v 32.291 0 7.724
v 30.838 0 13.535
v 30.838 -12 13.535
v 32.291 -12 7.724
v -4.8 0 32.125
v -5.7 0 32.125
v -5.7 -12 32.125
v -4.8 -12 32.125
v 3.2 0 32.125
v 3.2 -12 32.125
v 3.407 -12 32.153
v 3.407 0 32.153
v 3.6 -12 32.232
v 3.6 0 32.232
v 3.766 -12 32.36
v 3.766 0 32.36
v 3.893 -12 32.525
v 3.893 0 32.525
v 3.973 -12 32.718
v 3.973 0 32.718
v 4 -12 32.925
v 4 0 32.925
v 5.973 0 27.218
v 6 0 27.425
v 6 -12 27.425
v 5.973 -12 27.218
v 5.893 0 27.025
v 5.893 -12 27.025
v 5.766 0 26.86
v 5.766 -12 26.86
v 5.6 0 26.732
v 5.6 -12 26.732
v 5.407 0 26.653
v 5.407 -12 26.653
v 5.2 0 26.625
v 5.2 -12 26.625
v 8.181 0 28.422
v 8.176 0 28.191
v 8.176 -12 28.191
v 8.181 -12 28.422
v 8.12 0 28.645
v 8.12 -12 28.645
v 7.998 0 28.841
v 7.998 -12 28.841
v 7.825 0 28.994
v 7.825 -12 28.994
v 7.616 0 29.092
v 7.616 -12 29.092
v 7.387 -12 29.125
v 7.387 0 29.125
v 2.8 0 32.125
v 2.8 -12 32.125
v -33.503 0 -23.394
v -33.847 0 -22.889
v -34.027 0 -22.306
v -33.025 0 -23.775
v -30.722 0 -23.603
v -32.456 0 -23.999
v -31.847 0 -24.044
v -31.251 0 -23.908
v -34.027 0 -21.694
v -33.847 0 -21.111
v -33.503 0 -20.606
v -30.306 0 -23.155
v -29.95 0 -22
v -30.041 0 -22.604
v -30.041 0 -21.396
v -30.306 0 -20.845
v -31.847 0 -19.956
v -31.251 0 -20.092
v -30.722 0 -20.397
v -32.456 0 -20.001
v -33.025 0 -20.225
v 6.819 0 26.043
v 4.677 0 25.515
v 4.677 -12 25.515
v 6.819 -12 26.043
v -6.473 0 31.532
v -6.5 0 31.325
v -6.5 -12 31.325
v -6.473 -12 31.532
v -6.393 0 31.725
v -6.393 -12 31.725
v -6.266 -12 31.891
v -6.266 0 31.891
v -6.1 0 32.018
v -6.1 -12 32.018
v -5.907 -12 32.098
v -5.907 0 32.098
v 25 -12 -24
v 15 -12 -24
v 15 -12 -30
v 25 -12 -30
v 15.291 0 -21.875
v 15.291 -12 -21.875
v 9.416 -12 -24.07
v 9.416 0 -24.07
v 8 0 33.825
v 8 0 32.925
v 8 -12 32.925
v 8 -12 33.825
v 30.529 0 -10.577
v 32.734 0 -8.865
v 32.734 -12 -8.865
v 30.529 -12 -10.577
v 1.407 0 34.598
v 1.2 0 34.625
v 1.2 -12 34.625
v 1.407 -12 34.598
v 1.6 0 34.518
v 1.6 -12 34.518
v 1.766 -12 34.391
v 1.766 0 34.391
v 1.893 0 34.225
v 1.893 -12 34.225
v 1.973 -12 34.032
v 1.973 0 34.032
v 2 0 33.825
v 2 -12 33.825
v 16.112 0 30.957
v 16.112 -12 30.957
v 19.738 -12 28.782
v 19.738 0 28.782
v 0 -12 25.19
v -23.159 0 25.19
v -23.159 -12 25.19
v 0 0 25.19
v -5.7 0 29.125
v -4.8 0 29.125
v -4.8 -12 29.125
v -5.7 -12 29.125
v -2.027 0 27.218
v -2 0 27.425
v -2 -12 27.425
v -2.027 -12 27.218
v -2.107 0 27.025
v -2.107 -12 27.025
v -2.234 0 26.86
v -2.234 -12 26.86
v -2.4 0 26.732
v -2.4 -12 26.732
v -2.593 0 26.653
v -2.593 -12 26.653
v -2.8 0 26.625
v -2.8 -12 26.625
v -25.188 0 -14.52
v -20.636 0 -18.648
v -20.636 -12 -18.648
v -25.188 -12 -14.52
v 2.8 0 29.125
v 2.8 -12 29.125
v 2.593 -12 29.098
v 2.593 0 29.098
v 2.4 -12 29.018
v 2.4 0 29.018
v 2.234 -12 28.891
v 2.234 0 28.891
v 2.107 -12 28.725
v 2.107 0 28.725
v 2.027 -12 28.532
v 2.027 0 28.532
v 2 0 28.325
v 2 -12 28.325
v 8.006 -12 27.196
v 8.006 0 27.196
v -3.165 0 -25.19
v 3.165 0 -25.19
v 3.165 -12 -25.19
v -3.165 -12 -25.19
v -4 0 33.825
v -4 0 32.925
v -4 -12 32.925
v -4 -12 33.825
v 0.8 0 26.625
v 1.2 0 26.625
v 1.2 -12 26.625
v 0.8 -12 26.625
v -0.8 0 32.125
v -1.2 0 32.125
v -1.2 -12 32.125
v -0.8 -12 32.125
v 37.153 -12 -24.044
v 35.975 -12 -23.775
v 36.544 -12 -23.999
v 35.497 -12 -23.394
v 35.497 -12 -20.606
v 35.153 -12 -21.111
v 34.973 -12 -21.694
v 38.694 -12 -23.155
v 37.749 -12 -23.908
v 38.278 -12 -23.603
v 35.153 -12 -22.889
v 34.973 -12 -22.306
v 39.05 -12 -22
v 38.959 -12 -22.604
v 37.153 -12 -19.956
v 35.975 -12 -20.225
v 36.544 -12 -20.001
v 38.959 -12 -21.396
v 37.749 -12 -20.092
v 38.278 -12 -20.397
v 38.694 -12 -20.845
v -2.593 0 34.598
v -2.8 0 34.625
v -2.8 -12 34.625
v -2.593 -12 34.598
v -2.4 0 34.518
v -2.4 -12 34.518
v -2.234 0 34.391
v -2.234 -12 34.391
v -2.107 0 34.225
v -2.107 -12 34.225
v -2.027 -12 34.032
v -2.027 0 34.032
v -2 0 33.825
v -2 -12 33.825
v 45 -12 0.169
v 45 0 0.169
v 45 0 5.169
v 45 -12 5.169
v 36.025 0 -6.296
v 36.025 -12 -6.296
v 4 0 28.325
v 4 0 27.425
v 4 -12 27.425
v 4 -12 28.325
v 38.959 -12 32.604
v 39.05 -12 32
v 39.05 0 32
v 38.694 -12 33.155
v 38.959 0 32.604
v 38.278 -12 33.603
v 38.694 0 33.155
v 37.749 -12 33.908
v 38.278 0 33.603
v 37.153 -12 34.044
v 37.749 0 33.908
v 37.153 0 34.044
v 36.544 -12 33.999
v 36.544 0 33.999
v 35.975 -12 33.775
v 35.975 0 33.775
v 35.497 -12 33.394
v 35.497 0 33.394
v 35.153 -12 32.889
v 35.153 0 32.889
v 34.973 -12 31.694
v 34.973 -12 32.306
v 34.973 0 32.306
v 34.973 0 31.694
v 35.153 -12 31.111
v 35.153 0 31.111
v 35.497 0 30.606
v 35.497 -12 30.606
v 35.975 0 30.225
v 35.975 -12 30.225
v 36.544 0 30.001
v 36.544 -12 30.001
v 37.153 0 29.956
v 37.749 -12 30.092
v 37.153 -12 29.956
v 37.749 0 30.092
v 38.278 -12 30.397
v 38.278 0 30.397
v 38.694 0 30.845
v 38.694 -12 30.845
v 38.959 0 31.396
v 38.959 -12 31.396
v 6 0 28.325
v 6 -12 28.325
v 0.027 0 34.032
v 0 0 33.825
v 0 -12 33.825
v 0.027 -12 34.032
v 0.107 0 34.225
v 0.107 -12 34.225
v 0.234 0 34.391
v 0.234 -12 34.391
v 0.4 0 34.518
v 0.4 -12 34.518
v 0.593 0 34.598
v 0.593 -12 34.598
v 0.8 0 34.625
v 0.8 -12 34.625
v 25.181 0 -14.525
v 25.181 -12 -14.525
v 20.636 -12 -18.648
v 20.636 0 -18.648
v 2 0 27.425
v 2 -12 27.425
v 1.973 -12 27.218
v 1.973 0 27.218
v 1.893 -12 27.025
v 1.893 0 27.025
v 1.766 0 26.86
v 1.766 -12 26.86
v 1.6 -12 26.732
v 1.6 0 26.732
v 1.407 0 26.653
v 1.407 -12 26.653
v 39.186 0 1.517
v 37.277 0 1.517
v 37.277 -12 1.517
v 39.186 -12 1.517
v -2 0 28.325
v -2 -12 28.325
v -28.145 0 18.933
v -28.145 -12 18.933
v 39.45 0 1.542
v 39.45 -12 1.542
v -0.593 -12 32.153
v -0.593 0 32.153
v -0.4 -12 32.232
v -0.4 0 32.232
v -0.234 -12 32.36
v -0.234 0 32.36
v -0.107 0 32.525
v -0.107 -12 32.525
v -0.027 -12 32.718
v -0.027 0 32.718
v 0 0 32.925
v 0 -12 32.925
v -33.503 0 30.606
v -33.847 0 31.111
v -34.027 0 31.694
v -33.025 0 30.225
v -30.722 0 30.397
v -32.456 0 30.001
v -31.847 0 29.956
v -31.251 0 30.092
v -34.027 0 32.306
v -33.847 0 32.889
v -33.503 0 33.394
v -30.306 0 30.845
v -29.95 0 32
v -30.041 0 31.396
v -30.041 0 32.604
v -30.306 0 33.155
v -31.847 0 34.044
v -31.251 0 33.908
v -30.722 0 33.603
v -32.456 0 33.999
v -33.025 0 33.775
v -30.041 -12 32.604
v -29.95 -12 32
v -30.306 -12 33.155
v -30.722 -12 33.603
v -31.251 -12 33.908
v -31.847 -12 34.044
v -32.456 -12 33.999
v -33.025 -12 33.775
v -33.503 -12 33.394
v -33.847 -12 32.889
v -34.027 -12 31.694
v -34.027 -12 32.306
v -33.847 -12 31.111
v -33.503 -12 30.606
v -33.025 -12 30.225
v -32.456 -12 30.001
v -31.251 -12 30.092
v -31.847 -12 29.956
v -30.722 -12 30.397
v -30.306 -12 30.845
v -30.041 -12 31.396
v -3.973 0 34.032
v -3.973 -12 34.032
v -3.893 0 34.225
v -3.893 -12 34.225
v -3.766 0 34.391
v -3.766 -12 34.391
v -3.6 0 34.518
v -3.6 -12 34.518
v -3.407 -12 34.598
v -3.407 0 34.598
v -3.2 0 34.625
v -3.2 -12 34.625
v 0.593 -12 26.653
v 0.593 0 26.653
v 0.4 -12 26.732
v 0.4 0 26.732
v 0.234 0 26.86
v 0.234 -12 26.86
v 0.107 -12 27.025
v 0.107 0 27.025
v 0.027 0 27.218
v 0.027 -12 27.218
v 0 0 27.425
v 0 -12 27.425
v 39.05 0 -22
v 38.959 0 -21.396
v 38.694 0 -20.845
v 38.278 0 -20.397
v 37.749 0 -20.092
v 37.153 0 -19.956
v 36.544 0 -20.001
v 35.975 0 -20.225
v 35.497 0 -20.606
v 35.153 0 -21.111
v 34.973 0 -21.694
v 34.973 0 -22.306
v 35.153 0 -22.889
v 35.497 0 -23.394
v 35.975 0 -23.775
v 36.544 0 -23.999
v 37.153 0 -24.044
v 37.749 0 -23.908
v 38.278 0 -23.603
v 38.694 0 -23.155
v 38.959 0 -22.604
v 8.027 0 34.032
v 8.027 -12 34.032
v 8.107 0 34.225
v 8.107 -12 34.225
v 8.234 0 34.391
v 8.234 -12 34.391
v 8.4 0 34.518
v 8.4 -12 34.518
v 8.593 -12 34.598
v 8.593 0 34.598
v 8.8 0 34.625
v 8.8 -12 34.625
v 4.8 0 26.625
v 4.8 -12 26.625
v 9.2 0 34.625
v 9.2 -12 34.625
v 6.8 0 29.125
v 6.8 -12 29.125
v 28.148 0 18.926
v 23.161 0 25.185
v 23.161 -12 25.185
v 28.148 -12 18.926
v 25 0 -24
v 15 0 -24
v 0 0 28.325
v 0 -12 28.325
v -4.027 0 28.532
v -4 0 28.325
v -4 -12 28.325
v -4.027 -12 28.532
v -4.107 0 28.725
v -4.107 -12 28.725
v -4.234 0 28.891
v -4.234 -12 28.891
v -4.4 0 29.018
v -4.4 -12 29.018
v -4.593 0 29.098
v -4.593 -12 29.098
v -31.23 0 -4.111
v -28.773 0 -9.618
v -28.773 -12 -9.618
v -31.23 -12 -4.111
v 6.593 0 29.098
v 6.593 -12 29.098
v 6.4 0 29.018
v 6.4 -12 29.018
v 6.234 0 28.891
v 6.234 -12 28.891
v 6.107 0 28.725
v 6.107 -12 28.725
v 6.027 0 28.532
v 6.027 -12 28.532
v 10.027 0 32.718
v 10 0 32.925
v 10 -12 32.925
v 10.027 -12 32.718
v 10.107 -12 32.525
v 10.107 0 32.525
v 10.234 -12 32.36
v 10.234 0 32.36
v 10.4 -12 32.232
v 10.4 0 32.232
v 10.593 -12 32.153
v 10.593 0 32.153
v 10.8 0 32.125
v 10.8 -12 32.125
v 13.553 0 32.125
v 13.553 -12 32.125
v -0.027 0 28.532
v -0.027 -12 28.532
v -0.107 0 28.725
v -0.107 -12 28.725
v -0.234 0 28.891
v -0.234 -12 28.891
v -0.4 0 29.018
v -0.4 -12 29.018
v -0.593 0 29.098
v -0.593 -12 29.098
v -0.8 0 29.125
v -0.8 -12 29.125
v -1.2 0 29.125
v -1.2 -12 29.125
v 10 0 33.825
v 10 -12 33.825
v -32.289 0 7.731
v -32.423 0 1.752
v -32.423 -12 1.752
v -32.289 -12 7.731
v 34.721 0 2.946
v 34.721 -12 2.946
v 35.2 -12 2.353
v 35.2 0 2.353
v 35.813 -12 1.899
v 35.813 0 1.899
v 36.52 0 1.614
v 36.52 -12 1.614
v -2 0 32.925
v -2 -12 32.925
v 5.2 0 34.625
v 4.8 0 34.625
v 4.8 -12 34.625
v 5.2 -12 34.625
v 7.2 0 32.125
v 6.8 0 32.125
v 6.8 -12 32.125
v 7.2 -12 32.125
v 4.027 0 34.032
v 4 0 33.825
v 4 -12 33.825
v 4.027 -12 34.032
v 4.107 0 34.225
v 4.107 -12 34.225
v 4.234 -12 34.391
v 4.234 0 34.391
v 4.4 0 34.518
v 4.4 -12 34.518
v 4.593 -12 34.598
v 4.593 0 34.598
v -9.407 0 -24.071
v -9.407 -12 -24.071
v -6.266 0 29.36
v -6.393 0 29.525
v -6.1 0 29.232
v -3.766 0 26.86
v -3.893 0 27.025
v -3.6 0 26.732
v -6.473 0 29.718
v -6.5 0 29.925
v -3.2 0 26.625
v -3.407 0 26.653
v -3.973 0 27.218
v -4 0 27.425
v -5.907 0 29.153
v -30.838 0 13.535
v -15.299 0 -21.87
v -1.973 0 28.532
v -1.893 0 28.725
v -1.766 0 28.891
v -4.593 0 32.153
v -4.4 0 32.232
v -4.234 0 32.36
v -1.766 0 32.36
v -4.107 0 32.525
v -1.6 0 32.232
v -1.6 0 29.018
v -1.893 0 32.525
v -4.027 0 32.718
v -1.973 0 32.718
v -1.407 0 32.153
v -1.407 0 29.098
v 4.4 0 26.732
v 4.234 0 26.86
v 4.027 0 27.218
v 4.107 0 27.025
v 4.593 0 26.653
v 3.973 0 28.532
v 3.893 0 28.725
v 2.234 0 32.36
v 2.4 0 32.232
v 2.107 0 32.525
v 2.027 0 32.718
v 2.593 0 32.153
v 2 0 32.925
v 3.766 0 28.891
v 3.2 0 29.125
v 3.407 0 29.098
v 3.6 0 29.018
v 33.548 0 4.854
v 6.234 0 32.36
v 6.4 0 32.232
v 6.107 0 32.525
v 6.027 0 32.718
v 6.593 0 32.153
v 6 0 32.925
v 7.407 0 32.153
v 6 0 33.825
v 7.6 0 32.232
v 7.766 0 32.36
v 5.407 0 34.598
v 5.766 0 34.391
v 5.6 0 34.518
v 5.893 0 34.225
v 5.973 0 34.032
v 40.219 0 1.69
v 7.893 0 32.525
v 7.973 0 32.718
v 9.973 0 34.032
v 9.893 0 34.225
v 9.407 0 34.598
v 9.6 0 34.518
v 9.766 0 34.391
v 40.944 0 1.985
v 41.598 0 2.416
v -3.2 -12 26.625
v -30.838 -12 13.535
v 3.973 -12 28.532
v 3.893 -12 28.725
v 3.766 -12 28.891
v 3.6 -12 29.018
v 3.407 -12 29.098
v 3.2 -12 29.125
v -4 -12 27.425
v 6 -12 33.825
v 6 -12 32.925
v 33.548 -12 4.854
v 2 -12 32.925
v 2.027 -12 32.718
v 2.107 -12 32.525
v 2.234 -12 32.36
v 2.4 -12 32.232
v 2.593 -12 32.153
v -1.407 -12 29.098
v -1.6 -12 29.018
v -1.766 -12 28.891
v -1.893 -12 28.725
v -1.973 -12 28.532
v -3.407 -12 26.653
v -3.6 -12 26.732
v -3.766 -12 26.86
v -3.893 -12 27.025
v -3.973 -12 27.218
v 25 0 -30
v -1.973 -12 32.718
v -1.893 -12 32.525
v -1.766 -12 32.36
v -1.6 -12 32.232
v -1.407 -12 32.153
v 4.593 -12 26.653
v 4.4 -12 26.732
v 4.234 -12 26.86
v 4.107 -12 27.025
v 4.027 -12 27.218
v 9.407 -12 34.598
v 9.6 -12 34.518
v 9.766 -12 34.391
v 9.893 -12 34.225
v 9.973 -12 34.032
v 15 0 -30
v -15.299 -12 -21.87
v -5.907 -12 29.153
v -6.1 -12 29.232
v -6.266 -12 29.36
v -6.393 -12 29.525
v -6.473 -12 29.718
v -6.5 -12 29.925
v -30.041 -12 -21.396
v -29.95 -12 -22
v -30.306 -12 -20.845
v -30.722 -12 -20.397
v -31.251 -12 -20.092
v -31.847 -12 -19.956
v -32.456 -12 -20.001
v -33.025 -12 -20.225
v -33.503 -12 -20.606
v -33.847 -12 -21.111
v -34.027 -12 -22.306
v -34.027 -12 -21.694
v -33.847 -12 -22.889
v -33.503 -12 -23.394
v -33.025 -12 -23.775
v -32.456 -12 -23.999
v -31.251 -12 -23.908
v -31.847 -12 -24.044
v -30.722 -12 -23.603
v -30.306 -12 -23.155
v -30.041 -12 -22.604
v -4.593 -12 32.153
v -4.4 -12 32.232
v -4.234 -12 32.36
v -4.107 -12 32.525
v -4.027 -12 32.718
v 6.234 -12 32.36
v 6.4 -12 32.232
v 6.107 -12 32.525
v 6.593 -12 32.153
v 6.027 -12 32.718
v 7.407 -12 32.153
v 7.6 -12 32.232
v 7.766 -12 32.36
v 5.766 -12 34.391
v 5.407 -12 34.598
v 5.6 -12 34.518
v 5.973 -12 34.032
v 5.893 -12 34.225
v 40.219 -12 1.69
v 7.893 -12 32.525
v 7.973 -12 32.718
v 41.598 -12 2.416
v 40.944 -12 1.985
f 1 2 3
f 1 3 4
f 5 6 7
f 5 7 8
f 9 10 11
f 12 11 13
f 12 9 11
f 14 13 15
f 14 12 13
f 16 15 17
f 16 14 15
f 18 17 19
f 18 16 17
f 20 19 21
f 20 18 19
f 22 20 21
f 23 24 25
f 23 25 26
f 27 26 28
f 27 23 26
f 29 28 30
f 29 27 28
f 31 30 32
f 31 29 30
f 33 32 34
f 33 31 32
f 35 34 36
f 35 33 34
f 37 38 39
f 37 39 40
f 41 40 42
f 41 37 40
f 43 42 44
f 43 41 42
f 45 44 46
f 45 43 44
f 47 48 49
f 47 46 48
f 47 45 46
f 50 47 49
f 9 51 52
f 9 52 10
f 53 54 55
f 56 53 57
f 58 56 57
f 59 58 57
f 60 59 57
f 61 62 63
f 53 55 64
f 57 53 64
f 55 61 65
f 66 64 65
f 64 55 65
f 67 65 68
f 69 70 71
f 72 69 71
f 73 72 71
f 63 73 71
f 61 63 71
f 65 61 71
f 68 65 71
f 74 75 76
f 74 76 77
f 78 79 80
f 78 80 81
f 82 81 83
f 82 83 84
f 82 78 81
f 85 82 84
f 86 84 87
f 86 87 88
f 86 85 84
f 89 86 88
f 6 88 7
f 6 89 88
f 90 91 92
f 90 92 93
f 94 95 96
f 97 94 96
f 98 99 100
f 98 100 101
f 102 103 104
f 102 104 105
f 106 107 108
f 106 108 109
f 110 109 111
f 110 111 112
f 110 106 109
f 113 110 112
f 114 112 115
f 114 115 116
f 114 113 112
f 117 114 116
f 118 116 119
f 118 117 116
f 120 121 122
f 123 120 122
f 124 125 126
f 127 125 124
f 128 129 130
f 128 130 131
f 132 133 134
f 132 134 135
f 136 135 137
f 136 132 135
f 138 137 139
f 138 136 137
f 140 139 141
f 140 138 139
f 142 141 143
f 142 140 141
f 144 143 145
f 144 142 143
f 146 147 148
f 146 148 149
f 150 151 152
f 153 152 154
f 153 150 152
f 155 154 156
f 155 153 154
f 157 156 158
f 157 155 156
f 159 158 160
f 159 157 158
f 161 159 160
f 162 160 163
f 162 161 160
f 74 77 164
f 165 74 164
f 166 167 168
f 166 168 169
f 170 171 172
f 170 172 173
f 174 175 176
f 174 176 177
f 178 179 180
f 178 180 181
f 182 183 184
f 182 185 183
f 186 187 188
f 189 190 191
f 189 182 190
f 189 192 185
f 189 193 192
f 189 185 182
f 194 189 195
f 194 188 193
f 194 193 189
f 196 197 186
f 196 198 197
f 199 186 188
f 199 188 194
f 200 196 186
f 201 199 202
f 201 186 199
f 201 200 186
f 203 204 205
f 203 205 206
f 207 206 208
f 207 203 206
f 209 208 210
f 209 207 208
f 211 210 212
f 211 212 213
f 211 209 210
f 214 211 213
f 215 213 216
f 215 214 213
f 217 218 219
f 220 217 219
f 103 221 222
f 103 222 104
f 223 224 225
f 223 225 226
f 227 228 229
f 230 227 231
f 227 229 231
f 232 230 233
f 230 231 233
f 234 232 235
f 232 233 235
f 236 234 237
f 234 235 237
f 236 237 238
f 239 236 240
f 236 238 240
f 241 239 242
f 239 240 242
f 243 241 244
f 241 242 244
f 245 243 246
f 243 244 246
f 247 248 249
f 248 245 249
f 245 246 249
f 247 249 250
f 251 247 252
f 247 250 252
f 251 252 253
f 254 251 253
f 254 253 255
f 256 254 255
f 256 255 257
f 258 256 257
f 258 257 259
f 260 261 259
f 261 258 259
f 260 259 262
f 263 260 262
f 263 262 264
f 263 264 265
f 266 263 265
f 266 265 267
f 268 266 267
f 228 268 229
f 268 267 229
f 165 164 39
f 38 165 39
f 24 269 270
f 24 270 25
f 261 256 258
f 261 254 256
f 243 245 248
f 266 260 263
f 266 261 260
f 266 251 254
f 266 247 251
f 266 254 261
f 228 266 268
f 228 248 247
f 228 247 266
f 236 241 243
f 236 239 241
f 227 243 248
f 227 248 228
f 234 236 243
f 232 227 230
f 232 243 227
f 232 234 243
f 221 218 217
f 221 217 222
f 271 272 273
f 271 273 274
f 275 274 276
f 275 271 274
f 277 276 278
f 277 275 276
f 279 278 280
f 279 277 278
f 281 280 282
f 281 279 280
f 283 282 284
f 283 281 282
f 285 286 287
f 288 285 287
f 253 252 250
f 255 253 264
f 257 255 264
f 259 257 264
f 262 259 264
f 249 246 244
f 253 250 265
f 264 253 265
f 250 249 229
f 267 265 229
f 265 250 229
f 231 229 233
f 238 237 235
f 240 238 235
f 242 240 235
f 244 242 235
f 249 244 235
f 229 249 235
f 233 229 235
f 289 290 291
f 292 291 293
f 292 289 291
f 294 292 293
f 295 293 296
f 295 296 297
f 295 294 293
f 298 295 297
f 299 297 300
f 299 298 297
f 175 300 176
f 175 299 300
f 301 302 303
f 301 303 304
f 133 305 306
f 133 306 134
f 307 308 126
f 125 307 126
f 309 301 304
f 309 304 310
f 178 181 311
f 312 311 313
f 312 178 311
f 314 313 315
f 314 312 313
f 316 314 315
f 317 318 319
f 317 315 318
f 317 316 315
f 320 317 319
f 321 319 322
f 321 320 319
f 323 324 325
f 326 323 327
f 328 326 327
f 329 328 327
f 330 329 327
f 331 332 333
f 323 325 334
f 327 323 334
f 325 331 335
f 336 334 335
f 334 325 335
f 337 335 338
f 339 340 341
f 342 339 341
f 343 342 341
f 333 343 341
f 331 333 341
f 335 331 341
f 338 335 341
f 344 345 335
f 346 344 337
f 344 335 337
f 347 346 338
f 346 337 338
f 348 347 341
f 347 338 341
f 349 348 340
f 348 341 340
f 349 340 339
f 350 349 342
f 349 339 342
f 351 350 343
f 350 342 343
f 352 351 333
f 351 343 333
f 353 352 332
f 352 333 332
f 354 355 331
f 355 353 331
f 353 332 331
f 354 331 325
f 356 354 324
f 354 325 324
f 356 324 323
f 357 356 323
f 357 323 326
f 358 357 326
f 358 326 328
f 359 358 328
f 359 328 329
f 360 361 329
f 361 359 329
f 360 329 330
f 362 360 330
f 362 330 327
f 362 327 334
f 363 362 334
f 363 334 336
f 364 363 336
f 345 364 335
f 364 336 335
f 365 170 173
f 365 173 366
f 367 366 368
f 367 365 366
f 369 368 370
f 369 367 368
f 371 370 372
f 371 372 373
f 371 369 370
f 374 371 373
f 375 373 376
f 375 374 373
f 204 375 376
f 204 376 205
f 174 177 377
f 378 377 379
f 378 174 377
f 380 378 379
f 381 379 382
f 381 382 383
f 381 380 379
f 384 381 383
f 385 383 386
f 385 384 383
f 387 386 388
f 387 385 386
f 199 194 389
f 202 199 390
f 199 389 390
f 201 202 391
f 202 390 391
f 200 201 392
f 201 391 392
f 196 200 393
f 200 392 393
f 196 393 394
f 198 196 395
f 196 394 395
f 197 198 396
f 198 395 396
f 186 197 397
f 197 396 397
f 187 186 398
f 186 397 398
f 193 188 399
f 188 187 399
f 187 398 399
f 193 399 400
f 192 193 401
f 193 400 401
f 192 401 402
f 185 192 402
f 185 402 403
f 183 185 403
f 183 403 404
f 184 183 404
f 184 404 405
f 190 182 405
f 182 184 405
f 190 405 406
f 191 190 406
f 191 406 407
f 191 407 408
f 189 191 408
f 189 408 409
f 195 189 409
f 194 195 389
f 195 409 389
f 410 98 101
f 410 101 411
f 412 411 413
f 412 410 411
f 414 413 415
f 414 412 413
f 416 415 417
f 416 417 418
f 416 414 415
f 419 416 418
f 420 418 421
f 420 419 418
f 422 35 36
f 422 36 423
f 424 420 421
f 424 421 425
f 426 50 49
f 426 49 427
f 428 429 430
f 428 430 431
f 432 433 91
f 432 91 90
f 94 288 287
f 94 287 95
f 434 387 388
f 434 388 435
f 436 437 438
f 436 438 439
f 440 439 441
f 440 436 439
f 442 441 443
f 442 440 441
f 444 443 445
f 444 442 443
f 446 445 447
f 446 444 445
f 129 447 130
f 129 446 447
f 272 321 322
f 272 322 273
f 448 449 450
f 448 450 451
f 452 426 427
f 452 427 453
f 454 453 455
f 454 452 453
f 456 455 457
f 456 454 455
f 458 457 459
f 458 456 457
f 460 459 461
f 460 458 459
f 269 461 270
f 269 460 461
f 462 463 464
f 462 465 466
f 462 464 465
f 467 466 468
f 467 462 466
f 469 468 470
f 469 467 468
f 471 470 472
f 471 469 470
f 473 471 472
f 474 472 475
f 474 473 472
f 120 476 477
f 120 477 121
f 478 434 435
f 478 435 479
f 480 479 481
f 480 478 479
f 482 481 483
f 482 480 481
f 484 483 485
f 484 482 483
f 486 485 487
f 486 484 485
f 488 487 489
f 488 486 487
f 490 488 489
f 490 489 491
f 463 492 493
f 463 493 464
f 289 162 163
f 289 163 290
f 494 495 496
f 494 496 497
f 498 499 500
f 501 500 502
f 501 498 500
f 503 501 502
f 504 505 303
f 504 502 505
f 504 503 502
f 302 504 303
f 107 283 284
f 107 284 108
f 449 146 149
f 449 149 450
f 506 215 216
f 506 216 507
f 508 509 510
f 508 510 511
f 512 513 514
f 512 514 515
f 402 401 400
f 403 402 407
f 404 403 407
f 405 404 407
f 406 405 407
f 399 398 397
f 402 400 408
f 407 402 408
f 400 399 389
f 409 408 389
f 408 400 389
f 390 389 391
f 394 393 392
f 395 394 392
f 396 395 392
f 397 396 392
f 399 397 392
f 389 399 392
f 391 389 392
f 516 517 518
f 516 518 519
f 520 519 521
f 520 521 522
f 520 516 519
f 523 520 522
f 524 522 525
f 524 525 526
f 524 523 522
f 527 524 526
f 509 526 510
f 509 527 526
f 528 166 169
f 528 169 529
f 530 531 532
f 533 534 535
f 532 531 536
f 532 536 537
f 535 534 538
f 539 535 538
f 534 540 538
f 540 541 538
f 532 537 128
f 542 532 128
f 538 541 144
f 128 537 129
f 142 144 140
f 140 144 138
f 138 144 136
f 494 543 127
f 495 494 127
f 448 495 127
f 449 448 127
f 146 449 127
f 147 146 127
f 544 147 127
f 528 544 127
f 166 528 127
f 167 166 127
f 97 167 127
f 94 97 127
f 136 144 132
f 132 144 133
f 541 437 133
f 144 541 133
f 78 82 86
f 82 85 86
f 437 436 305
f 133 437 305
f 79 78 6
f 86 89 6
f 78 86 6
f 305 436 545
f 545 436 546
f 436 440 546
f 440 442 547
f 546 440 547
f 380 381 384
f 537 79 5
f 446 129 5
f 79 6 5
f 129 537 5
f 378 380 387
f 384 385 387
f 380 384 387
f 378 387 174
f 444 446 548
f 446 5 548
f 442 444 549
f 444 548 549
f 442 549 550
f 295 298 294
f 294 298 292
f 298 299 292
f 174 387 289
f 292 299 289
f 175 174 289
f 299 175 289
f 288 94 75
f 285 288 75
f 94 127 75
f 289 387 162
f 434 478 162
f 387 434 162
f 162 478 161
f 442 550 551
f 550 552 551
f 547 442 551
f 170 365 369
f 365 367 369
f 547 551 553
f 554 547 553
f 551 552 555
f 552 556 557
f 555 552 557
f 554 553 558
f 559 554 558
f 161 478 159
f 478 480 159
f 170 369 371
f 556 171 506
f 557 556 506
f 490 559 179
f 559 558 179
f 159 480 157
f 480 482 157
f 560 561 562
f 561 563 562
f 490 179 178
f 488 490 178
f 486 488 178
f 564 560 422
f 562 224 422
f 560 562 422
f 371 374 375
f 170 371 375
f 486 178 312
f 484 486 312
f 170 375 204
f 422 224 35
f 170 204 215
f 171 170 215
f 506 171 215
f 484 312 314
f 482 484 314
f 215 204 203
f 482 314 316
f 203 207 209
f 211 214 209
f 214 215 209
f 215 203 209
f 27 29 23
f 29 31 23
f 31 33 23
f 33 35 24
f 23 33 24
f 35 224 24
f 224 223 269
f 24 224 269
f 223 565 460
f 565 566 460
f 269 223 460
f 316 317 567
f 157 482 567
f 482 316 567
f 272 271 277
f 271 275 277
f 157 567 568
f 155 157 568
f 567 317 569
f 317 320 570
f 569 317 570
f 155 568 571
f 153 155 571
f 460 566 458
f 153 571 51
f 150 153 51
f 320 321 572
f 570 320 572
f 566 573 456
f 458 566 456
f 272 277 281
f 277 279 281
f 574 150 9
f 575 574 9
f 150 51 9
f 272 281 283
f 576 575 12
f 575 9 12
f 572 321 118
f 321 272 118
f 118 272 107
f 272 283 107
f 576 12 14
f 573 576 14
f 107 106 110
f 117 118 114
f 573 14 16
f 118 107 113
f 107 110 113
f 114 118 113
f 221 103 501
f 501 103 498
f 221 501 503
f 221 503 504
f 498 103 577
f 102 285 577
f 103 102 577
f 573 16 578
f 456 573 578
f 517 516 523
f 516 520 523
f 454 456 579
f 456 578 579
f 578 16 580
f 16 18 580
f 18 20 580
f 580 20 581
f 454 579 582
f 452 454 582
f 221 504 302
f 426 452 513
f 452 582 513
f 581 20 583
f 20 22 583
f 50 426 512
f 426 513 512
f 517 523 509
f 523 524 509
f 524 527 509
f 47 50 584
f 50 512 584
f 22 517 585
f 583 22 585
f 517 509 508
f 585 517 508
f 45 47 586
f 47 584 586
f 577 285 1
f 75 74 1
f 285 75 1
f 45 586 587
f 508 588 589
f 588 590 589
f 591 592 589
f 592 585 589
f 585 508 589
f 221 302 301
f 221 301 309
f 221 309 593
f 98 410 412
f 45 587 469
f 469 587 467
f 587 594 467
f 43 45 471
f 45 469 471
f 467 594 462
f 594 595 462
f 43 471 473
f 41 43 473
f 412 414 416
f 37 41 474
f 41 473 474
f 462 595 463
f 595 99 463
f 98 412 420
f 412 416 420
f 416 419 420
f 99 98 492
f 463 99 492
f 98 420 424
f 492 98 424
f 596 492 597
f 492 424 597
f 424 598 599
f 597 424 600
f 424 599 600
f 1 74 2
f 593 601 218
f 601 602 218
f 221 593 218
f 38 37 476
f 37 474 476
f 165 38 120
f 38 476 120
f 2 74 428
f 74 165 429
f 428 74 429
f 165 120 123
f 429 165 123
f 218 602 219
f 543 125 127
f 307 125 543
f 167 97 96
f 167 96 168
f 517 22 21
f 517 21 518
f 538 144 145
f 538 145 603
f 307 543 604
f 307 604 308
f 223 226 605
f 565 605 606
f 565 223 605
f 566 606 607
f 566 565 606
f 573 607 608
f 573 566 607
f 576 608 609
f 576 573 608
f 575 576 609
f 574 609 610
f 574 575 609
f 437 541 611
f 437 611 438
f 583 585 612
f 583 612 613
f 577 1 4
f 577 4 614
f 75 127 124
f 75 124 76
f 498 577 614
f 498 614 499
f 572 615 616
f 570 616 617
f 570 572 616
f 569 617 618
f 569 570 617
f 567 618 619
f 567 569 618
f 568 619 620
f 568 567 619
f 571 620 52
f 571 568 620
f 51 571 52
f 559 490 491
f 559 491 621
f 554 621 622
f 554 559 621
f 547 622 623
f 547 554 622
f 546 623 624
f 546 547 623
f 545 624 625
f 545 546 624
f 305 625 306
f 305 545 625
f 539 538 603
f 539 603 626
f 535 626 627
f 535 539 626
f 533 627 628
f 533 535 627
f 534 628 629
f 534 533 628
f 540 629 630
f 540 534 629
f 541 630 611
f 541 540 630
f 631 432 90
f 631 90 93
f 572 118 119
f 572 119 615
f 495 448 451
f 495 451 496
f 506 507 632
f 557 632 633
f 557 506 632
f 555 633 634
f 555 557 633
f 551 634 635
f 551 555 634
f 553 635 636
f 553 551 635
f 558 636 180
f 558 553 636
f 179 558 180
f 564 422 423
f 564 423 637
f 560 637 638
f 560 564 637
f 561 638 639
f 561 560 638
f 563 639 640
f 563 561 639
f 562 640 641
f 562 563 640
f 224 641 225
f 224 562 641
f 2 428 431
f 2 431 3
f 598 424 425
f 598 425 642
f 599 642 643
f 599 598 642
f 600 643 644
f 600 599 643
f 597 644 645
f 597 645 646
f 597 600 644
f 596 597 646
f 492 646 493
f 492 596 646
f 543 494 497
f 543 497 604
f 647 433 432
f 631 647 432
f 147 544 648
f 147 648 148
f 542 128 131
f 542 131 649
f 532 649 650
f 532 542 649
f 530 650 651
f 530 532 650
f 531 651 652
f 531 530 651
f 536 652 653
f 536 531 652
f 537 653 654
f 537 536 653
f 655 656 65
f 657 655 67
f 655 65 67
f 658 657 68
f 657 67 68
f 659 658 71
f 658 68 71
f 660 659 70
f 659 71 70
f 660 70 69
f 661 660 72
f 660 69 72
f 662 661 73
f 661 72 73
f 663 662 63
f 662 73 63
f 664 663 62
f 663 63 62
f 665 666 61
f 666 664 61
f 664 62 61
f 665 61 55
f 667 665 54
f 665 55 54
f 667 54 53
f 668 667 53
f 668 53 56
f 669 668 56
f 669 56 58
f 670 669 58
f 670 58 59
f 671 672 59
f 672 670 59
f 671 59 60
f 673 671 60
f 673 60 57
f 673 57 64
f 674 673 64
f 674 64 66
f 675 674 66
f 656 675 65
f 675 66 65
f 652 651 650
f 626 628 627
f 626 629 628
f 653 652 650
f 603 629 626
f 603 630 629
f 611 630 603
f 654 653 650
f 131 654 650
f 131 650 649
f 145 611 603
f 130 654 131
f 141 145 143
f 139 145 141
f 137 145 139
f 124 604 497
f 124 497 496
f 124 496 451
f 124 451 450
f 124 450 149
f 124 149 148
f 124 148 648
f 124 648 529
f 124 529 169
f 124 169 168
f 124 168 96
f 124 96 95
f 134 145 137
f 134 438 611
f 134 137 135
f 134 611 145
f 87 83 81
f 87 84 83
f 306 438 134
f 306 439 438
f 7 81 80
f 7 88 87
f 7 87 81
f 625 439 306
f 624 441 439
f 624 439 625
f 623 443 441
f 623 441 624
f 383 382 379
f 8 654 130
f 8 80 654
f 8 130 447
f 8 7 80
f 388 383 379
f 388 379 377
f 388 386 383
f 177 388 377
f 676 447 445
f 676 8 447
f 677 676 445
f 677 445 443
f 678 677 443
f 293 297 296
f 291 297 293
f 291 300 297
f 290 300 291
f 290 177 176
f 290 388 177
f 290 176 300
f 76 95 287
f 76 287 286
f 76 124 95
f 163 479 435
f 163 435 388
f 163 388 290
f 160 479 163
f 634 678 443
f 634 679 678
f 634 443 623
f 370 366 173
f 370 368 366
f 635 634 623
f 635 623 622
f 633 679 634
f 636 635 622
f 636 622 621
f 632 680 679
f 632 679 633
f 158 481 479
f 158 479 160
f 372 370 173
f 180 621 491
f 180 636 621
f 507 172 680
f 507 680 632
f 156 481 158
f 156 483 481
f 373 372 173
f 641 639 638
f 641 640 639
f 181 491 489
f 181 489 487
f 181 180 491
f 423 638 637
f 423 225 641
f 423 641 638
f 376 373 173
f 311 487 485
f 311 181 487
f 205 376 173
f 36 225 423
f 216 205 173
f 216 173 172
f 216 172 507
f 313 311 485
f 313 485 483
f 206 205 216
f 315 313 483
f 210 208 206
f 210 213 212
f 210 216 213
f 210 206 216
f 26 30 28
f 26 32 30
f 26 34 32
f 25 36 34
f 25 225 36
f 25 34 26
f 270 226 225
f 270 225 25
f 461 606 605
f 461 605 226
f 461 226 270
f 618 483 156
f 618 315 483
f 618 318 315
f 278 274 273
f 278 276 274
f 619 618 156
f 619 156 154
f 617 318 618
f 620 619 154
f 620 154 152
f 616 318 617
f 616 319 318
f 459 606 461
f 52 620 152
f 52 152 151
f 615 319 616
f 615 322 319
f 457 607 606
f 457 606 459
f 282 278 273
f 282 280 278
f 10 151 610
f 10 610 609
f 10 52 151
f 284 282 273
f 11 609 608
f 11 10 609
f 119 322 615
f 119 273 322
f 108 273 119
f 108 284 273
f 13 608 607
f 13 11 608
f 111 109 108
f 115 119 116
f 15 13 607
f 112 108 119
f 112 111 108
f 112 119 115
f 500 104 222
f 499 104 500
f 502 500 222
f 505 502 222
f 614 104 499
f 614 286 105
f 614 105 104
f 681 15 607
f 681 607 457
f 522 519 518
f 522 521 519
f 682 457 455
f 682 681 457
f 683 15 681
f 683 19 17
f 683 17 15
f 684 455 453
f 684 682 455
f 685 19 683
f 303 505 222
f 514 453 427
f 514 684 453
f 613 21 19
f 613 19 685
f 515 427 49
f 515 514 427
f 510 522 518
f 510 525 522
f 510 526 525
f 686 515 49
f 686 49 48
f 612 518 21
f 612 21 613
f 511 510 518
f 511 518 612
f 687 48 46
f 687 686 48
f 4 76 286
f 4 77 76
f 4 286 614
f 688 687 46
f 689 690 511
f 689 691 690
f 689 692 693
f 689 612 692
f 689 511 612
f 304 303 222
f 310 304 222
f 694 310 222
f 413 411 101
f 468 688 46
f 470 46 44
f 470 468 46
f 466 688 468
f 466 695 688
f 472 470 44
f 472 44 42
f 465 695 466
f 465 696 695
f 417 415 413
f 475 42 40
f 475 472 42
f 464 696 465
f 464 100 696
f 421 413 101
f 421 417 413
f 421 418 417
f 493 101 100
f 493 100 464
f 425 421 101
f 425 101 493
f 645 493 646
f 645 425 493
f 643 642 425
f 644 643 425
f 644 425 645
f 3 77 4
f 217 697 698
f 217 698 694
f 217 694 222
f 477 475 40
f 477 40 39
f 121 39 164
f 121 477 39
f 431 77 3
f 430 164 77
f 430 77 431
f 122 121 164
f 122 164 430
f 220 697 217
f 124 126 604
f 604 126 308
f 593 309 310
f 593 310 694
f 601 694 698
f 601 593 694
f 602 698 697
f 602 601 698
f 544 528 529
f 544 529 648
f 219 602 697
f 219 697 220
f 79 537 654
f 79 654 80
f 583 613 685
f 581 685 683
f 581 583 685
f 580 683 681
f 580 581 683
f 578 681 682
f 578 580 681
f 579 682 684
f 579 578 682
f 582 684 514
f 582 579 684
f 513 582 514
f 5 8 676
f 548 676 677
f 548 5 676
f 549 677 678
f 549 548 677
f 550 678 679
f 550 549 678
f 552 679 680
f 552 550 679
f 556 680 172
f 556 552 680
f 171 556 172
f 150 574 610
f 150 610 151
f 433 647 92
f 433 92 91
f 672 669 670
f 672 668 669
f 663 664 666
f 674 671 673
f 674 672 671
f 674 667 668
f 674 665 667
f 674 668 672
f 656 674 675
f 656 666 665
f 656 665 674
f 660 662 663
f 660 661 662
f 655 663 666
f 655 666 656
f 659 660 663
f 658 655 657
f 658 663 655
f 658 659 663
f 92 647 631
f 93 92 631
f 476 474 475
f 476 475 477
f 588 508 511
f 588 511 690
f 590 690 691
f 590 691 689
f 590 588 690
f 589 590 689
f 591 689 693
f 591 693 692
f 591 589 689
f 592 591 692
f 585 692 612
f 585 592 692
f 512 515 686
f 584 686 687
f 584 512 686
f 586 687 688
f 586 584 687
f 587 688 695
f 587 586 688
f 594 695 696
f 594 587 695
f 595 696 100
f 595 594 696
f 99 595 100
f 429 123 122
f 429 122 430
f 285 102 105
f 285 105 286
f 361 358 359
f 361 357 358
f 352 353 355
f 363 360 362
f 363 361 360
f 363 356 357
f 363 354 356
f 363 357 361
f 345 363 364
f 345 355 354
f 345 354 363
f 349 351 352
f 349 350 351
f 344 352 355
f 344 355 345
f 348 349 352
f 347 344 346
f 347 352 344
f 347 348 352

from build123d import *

# Parameters (mm, degrees)
F1_W     = 85
F1_H     = 70
F5_DEPTH = 12
F4_R     = 2.05
F6_DEPTH = 62.1


with BuildPart() as f5:
    # F1 (on Front) → F5 (new body)
    with BuildSketch(Plane.XZ):
        with Locations((2.5, 5)):
            Rectangle(F1_W, F1_H)
    extrude(amount=F5_DEPTH)

    # F4 (on Front) → F6 (cut)
    with BuildSketch(Plane.XZ):
        with BuildLine():
            Line((-31.2299812068, -4.1114716804), (-32.4227339013, 1.7524078222))
            Line((-32.4227339013, 1.7524078222), (-32.2888896622, 7.7311653504))
            Line((-32.2888896622, 7.7311653504), (-30.8379518083, 13.5349290141))
            Line((-30.8379518083, 13.5349290141), (-28.1447099737, 18.9326484028))
            Line((-28.1447099737, 18.9326484028), (-23.1589180792, 25.1899009997))
            Line((-23.1589180792, 25.1899009997), (0, 25.1899009997))
            Line((0, 25.1899009997), (4.6769347973, 25.515306741))
            Line((4.6769347973, 25.515306741), (6.8192416802, 26.0426457971))
            Line((6.8192416802, 26.0426457971), (8.0057503656, 27.1961949766))
            Line((8.0057503656, 27.1961949766), (8.175598207, 28.190600854))
            ThreePointArc((8.175598207, 28.190600854), (7.9984731162, 28.8411641896), (7.3870184391, 29.1252929092))
            Line((7.3870184391, 29.1252929092), (6.8, 29.1252929092))
            ThreePointArc((6.8, 29.1252929092), (6.2343145751, 28.8909783342), (6, 28.3252929092))
            Line((6, 28.3252929092), (6, 27.4252929092))
            ThreePointArc((6, 27.4252929092), (5.7656854249, 26.8596074843), (5.2, 26.6252929092))
            Line((5.2, 26.6252929092), (4.8, 26.6252929092))
            ThreePointArc((4.8, 26.6252929092), (4.2343145751, 26.8596074843), (4, 27.4252929092))
            Line((4, 27.4252929092), (4, 28.3252929092))
            ThreePointArc((4, 28.3252929092), (3.7656854249, 28.8909783342), (3.2, 29.1252929092))
            Line((3.2, 29.1252929092), (2.8, 29.1252929092))
            ThreePointArc((2.8, 29.1252929092), (2.2343145751, 28.8909783342), (2, 28.3252929092))
            Line((2, 28.3252929092), (2, 27.4252929092))
            ThreePointArc((2, 27.4252929092), (1.7656854249, 26.8596074843), (1.2, 26.6252929092))
            Line((1.2, 26.6252929092), (0.8, 26.6252929092))
            ThreePointArc((0.8, 26.6252929092), (0.2343145751, 26.8596074843), (0, 27.4252929092))
            Line((0, 27.4252929092), (0, 28.3252929092))
            ThreePointArc((0, 28.3252929092), (-0.2343145751, 28.8909783342), (-0.8, 29.1252929092))
            Line((-0.8, 29.1252929092), (-1.2, 29.1252929092))
            ThreePointArc((-1.2, 29.1252929092), (-1.7656854249, 28.8909783342), (-2, 28.3252929092))
            Line((-2, 28.3252929092), (-2, 27.4252929092))
            ThreePointArc((-2, 27.4252929092), (-2.2343145751, 26.8596074843), (-2.8, 26.6252929092))
            Line((-2.8, 26.6252929092), (-3.2, 26.6252929092))
            ThreePointArc((-3.2, 26.6252929092), (-3.7656854249, 26.8596074843), (-4, 27.4252929092))
            Line((-4, 27.4252929092), (-4, 28.3252929092))
            ThreePointArc((-4, 28.3252929092), (-4.2343145751, 28.8909783342), (-4.8, 29.1252929092))
            Line((-4.8, 29.1252929092), (-5.7, 29.1252929092))
            ThreePointArc((-5.7, 29.1252929092), (-6.2656854249, 29.3596074843), (-6.5, 29.9252929092))
            Line((-6.5, 29.9252929092), (-6.5, 31.3252929092))
            ThreePointArc((-6.5, 31.3252929092), (-6.2656854249, 31.8909783342), (-5.7, 32.1252929092))
            Line((-5.7, 32.1252929092), (-4.8, 32.1252929092))
            ThreePointArc((-4.8, 32.1252929092), (-4.2343145751, 32.3596074843), (-4, 32.9252929092))
            Line((-4, 32.9252929092), (-4, 33.8252929092))
            ThreePointArc((-4, 33.8252929092), (-3.7656854249, 34.3909783342), (-3.2, 34.6252929092))
            Line((-3.2, 34.6252929092), (-2.8, 34.6252929092))
            ThreePointArc((-2.8, 34.6252929092), (-2.2343145751, 34.3909783342), (-2, 33.8252929092))
            Line((-2, 33.8252929092), (-2, 32.9252929092))
            ThreePointArc((-2, 32.9252929092), (-1.7656854249, 32.3596074843), (-1.2, 32.1252929092))
            Line((-1.2, 32.1252929092), (-0.8, 32.1252929092))
            ThreePointArc((-0.8, 32.1252929092), (-0.2343145751, 32.3596074843), (0, 32.9252929092))
            Line((0, 32.9252929092), (0, 33.8252929092))
            ThreePointArc((0, 33.8252929092), (0.2343145751, 34.3909783342), (0.8, 34.6252929092))
            Line((0.8, 34.6252929092), (1.2, 34.6252929092))
            ThreePointArc((1.2, 34.6252929092), (1.7656854249, 34.3909783342), (2, 33.8252929092))
            Line((2, 33.8252929092), (2, 32.9252929092))
            ThreePointArc((2, 32.9252929092), (2.2343145751, 32.3596074843), (2.8, 32.1252929092))
            Line((2.8, 32.1252929092), (3.2, 32.1252929092))
            ThreePointArc((3.2, 32.1252929092), (3.7656854249, 32.3596074843), (4, 32.9252929092))
            Line((4, 32.9252929092), (4, 33.8252929092))
            ThreePointArc((4, 33.8252929092), (4.2343145751, 34.3909783342), (4.8, 34.6252929092))
            Line((4.8, 34.6252929092), (5.2, 34.6252929092))
            ThreePointArc((5.2, 34.6252929092), (5.7656854249, 34.3909783342), (6, 33.8252929092))
            Line((6, 33.8252929092), (6, 32.9252929092))
            ThreePointArc((6, 32.9252929092), (6.2343145751, 32.3596074843), (6.8, 32.1252929092))
            Line((6.8, 32.1252929092), (7.2, 32.1252929092))
            ThreePointArc((7.2, 32.1252929092), (7.7656854249, 32.3596074843), (8, 32.9252929092))
            Line((8, 32.9252929092), (8, 33.8252929092))
            ThreePointArc((8, 33.8252929092), (8.2343145751, 34.3909783342), (8.8, 34.6252929092))
            Line((8.8, 34.6252929092), (9.2, 34.6252929092))
            ThreePointArc((9.2, 34.6252929092), (9.7656854249, 34.3909783342), (10, 33.8252929092))
            Line((10, 33.8252929092), (10, 32.9252929092))
            ThreePointArc((10, 32.9252929092), (10.2343145751, 32.3596074843), (10.8, 32.1252929092))
            Line((10.8, 32.1252929092), (10.9885356627, 32.1252929092))
            Line((10.9885356627, 32.1252929092), (13.5531716812, 32.1252929092))
            Line((13.5531716812, 32.1252929092), (16.1120866663, 30.9570903004))
            Line((16.1120866663, 30.9570903004), (19.7375298716, 28.7818243773))
            Line((19.7375298716, 28.7818243773), (23.1610051704, 25.1846330154))
            Line((23.1610051704, 25.1846330154), (28.1482424629, 18.9255686875))
            Line((28.1482424629, 18.9255686875), (30.8379520327, 13.5349285645))
            Line((30.8379520327, 13.5349285645), (32.290701789, 7.7239123706))
            Line((32.290701789, 7.7239123706), (33.5483700037, 4.8540960997))
            Line((33.5483700037, 4.8540960997), (34.7211838335, 2.9462716643))
            ThreePointArc((34.7211838335, 2.9462716643), (35.8128741717, 1.8988475717), (37.2768951397, 1.5173667343))
            Line((37.2768951397, 1.5173667343), (39.1860567033, 1.5173667343))
            Line((39.1860567033, 1.5173667343), (39.4498927766, 1.5417703444))
            ThreePointArc((39.4498927766, 1.5417703444), (40.5887928176, 1.8196343038), (41.5982242897, 2.4157465302))
            Line((41.5982242897, 2.4157465302), (45, 5.1694697241))
            Line((45, 5.1694697241), (45, 40))
            Line((45, 40), (-40, 40))
            Line((-40, 40), (-40, -30))
            Line((-40, -30), (15, -30))
            Line((15, -30), (15, -24))
            Line((15, -24), (25, -24))
            Line((25, -24), (25, -30))
            Line((25, -30), (45, -30))
            Line((45, -30), (45, 0.1694697241))
            Line((45, 0.1694697241), (36.0250361264, -6.2958477065))
            Line((36.0250361264, -6.2958477065), (32.733798027, -8.8646188378))
            Line((32.733798027, -8.8646188378), (30.5286142975, -10.5767725036))
            Line((30.5286142975, -10.5767725036), (25.1814303744, -14.5250959721))
            Line((25.1814303744, -14.5250959721), (20.6364464315, -18.6477240923))
            Line((20.6364464315, -18.6477240923), (15.2913826186, -21.8750180972))
            Line((15.2913826186, -21.8750180972), (9.4160128543, -24.0695341256))
            Line((9.4160128543, -24.0695341256), (3.1645428201, -25.189627))
            Line((3.1645428201, -25.189627), (-3.1645438201, -25.189627))
            Line((-3.1645438201, -25.189627), (-9.4069449348, -24.0711590285))
            Line((-9.4069449348, -24.0711590285), (-15.29903657, -21.8703966676))
            Line((-15.29903657, -21.8703966676), (-20.6364439779, -18.647726234))
            Line((-20.6364439779, -18.647726234), (-25.1875165353, -14.5195763818))
            Line((-25.1875165353, -14.5195763818), (-28.7727317318, -9.6175337402))
            Line((-28.7727317318, -9.6175337402), (-31.2299812068, -4.1114716804))
        make_face()
        with Locations((-32, -22)):
            Circle(F4_R, mode=Mode.SUBTRACT)
        with Locations((37, -22)):
            Circle(F4_R, mode=Mode.SUBTRACT)
        with Locations((-32, 32)):
            Circle(F4_R, mode=Mode.SUBTRACT)
        with Locations((37, 32)):
            Circle(F4_R, mode=Mode.SUBTRACT)
    extrude(amount=F6_DEPTH, mode=Mode.SUBTRACT)


solid = f5.part
